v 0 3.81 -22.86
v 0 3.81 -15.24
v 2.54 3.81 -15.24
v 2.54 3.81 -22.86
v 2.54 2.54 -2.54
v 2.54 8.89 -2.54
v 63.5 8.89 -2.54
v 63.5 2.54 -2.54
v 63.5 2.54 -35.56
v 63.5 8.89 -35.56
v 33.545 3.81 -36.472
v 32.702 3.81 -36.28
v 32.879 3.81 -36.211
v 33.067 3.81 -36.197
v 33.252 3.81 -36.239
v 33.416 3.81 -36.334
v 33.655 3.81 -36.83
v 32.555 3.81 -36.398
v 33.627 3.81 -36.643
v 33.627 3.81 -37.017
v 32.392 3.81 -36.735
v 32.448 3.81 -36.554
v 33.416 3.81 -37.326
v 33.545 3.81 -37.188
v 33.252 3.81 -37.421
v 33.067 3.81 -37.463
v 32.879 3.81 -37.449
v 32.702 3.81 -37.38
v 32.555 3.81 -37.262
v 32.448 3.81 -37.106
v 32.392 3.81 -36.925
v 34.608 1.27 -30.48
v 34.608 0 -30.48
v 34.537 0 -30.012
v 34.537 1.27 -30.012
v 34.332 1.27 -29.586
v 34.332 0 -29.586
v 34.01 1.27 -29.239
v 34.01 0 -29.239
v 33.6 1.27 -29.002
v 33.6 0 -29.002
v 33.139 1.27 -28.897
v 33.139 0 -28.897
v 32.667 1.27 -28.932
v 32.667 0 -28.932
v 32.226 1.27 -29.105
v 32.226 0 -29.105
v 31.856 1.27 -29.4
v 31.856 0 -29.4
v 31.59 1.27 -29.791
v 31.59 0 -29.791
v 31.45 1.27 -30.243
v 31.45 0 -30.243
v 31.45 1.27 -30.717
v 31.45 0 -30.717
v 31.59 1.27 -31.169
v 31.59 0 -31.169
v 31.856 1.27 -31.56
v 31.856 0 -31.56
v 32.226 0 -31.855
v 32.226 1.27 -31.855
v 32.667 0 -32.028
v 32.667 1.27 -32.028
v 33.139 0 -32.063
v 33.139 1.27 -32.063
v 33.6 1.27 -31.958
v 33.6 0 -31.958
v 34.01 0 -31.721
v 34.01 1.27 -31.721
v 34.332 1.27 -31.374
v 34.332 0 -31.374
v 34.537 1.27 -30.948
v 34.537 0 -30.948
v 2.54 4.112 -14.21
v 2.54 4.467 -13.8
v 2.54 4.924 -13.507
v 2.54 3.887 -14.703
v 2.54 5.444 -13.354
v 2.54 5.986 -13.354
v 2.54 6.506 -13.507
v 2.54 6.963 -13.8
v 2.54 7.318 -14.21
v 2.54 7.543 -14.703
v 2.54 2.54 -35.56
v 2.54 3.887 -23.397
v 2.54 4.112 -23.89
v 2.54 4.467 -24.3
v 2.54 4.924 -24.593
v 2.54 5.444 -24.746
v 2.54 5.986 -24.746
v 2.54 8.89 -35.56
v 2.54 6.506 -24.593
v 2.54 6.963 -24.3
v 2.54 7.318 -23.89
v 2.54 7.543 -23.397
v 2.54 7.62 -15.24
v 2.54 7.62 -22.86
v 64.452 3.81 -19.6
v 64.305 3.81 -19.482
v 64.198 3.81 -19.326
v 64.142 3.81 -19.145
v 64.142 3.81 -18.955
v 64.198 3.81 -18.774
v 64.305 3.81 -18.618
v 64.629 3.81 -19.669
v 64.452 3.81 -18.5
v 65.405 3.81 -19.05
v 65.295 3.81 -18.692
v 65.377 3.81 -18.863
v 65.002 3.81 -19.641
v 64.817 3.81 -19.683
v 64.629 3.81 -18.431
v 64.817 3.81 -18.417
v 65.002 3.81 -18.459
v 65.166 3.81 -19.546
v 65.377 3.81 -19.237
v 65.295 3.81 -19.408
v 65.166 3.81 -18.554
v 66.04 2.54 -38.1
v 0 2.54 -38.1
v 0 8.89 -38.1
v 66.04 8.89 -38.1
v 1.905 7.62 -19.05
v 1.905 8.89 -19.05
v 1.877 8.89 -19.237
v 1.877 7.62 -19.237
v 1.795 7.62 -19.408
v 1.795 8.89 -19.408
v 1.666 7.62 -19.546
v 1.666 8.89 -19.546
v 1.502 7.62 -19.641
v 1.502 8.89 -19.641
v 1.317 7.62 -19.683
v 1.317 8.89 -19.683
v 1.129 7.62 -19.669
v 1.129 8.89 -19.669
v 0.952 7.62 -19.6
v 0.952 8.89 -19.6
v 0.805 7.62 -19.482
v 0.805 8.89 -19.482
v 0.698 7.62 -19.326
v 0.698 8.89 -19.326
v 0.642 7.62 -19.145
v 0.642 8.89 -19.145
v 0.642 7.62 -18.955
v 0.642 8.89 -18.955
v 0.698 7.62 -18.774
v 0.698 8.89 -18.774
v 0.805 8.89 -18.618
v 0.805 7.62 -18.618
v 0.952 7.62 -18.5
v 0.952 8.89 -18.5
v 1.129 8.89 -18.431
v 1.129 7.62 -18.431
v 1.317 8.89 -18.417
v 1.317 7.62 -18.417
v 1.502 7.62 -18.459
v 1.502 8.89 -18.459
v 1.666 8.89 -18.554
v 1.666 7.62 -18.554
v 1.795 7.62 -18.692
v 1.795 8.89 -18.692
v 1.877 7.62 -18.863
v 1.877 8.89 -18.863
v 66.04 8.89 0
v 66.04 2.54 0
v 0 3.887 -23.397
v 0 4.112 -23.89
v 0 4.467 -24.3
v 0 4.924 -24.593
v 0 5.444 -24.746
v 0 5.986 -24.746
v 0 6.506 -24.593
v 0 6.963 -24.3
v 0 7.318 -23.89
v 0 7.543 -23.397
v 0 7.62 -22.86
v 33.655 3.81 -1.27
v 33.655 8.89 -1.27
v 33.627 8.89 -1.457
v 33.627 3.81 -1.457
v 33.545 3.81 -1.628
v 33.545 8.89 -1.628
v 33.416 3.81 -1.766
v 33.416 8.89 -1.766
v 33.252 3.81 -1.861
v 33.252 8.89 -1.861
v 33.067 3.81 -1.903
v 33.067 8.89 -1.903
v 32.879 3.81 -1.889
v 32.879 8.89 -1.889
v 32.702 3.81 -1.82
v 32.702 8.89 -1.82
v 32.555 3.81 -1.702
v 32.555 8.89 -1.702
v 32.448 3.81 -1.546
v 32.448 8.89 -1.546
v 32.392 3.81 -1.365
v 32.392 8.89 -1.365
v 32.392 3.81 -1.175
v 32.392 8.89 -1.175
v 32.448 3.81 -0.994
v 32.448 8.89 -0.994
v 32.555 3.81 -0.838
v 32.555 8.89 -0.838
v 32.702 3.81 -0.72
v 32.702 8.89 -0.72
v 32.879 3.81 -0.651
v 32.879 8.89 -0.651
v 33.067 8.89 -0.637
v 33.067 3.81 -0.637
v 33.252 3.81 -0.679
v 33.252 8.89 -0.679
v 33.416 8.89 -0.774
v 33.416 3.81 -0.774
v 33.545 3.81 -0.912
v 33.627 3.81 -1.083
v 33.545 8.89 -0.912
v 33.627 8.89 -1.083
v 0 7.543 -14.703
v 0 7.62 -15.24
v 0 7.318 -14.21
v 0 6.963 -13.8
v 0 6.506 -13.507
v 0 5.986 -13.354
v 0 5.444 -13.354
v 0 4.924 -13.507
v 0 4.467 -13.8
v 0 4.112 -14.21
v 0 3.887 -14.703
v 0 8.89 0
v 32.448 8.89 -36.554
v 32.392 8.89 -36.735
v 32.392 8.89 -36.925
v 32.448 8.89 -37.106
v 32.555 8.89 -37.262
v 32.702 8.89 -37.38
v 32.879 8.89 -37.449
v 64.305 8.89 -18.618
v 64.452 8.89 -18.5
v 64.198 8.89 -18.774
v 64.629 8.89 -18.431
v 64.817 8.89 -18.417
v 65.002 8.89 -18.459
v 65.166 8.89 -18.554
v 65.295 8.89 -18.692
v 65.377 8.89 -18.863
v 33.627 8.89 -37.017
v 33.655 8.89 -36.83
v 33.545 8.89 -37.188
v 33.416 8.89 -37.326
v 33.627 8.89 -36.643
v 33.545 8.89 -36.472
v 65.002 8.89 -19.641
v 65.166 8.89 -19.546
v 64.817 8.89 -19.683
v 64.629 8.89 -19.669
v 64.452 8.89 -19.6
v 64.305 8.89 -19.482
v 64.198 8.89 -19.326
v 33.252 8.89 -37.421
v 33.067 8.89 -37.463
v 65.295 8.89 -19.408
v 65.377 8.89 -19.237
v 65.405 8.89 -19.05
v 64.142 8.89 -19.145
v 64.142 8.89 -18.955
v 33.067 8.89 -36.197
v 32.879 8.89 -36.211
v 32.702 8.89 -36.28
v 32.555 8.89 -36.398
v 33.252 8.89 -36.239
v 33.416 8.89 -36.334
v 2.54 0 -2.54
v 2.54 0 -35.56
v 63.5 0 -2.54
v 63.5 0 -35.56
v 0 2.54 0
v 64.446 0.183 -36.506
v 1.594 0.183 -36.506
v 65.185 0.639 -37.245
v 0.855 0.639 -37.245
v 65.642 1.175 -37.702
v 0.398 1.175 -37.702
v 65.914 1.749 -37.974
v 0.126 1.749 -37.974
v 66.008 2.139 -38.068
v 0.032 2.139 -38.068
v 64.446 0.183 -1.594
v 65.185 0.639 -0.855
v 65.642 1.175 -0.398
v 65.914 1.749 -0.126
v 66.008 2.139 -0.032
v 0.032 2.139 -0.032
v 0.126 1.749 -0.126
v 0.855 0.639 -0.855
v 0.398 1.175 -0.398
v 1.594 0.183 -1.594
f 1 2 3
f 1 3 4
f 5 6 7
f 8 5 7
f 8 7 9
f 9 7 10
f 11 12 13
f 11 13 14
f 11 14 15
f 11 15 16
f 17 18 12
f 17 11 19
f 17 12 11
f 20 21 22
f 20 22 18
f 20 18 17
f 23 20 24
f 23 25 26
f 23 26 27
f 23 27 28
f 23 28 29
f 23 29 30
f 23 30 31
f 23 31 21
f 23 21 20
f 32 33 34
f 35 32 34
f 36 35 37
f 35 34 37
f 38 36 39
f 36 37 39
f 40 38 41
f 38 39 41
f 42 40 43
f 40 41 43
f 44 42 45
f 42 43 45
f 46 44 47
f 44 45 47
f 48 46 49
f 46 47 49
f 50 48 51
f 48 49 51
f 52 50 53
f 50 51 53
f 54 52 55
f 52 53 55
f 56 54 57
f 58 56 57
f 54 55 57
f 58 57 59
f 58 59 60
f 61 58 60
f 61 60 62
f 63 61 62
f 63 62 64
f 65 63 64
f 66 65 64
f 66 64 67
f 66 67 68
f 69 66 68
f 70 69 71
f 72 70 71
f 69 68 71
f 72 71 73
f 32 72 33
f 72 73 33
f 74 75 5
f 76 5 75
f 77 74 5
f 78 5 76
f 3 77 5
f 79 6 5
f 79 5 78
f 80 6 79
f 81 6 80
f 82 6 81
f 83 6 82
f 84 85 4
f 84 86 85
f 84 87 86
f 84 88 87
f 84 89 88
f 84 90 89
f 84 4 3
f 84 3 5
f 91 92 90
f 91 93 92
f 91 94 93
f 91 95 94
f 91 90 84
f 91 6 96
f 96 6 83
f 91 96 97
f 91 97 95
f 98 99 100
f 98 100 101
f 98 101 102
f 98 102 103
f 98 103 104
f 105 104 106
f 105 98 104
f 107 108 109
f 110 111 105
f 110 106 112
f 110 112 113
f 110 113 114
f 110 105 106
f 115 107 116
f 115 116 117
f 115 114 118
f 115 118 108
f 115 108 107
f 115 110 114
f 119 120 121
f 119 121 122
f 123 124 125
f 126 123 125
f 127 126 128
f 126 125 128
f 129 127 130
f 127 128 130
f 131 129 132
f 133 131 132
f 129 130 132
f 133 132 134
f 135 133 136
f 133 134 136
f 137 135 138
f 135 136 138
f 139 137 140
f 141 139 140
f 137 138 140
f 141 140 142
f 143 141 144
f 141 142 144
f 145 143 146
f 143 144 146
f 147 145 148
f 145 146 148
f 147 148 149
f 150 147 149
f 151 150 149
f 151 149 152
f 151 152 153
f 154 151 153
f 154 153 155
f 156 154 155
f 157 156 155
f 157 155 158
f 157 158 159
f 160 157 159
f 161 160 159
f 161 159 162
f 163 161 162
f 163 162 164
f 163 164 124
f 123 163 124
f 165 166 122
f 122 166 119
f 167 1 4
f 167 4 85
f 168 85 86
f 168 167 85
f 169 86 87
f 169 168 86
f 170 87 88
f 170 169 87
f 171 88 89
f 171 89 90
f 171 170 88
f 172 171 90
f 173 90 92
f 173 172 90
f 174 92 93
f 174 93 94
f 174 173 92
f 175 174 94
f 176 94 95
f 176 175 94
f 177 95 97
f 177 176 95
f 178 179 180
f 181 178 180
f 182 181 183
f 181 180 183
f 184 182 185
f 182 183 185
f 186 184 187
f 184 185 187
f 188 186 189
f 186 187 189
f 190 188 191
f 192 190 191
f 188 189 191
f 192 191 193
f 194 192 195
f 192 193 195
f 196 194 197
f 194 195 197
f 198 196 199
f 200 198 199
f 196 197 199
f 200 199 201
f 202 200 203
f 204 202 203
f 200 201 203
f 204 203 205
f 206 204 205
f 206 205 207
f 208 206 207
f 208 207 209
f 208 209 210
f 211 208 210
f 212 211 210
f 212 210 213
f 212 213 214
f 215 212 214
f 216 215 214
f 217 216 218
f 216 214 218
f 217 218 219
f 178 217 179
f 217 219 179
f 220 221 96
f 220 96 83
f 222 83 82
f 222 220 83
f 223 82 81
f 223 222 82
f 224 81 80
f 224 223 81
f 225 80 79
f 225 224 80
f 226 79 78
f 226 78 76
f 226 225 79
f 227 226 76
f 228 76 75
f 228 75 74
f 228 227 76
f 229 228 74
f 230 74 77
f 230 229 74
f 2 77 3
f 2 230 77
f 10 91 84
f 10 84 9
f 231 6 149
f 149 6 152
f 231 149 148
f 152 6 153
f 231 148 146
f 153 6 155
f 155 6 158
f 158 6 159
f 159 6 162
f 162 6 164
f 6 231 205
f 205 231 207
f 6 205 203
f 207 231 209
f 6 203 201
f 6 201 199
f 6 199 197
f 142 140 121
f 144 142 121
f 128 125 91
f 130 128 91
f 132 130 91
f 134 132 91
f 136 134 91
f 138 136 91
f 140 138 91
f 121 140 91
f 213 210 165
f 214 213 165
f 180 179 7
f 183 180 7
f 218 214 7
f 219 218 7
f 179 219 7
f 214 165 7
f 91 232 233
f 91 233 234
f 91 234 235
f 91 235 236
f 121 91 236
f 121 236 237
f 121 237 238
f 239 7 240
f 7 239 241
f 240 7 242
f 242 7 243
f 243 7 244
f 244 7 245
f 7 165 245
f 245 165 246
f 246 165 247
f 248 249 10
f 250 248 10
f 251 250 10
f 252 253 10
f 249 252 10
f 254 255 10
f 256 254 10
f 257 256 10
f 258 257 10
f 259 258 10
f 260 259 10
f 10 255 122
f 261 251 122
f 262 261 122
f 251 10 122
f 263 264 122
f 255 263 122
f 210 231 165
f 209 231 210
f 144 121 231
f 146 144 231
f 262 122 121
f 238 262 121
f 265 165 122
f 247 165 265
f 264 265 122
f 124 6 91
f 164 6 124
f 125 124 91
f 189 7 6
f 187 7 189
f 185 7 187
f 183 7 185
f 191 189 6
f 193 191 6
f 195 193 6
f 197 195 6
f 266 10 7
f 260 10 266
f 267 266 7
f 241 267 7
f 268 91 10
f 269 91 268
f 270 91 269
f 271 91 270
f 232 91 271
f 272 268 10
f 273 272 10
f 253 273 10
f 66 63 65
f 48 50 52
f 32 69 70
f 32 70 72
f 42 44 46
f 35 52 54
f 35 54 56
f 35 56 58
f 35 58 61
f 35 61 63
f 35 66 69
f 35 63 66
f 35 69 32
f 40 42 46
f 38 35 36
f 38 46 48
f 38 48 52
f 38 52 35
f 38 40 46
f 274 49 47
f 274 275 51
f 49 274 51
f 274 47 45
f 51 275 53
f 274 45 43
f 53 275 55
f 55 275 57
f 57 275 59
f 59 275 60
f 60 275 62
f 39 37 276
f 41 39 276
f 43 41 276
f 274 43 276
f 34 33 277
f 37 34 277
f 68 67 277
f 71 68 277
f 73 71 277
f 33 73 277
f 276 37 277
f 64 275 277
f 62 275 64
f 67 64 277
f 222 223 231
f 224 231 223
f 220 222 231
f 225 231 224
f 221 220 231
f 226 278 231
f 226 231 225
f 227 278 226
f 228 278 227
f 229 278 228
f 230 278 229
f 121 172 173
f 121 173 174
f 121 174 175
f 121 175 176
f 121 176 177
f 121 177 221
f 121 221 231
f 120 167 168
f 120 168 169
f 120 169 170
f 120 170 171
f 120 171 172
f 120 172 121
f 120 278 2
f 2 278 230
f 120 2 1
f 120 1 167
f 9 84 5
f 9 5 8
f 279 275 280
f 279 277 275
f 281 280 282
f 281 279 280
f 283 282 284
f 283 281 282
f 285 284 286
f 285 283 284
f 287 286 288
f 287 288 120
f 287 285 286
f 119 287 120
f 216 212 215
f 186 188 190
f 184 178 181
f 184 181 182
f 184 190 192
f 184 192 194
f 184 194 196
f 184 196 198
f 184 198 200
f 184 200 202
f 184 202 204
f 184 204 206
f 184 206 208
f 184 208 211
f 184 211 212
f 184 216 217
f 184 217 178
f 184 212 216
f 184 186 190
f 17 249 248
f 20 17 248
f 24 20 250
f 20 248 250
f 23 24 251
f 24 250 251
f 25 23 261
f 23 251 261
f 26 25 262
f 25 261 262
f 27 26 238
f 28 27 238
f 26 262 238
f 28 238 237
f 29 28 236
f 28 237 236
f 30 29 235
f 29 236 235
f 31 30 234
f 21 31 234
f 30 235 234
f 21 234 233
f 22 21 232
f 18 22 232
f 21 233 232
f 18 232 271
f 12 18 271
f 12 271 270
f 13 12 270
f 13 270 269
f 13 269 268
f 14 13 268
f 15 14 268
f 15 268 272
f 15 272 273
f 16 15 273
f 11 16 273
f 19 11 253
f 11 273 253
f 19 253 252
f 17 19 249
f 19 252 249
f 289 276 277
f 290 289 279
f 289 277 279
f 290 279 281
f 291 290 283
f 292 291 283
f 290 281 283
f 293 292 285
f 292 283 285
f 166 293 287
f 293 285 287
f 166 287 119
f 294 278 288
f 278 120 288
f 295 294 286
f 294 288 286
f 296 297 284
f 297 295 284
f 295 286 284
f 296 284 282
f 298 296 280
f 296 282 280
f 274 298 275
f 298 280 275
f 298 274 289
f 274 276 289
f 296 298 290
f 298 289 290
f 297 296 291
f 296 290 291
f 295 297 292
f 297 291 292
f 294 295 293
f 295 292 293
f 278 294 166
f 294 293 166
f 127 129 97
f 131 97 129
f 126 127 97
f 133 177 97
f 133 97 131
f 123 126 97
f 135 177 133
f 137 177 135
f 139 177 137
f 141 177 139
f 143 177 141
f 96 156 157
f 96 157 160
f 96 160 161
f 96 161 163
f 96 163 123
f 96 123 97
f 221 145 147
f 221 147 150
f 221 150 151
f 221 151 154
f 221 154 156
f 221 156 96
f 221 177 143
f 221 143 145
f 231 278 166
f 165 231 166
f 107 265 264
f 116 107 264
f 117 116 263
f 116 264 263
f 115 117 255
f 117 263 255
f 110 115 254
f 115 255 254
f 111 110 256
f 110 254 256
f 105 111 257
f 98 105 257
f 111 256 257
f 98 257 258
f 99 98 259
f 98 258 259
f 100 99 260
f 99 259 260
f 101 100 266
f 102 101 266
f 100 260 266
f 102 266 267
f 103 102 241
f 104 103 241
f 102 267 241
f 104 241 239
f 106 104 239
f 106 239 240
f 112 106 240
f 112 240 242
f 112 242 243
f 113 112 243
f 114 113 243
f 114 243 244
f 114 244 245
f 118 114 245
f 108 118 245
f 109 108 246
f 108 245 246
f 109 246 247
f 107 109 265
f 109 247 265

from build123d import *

# Parameters (mm, degrees)
SKETCH1_W           = 66.04
SKETCH1_H           = 38.1
BOSS_EXTRUDE3_DEPTH = 17.78
SKETCH3_W           = 60.96
SKETCH3_H           = 33.02
CUT_EXTRUDE1_DEPTH  = 15.24
SKETCH4_W           = 38.1
SKETCH4_H           = 8.89
CUT_EXTRUDE2_DEPTH  = 66.04
SKETCH5_R           = 0.635
CUT_EXTRUDE3_DEPTH  = 5.08
CUT_EXTRUDE5_DEPTH  = 2.54
FILLET1_R           = 2.54
SKETCH7_R           = 1.5875
CUT_EXTRUDE6_DEPTH  = 1.27


with BuildPart() as part:
    # Sketch1 → Boss-Extrude3 (new body)
    with BuildSketch(Plane(origin=(0, 0, 0), x_dir=(1, 0, 0), z_dir=(0, 1, 0))):
        with Locations((33.02, 19.05)):
            Rectangle(SKETCH1_W, SKETCH1_H)
    extrude(amount=BOSS_EXTRUDE3_DEPTH)

    # Sketch3 → Cut-Extrude1 (cut)
    with BuildSketch(Plane(origin=(0, 17.78, 0), x_dir=(1, 0, 0), z_dir=(0, 1, 0))):
        with Locations((33.02, 19.05)):
            Rectangle(SKETCH3_W, SKETCH3_H)
    extrude(amount=-CUT_EXTRUDE1_DEPTH, mode=Mode.SUBTRACT)

    # Sketch4 → Cut-Extrude2 (cut)
    with BuildSketch(Plane(origin=(66.04, 0, 0), x_dir=(0, 0, -1), z_dir=(1, 0, 0))):
        with Locations((19.05, 13.335)):
            Rectangle(SKETCH4_W, SKETCH4_H)
    extrude(amount=-CUT_EXTRUDE2_DEPTH, mode=Mode.SUBTRACT)

    # Sketch5 → Cut-Extrude3 (cut)
    with BuildSketch(Plane(origin=(0, 8.89, 0), x_dir=(1, 0, 0), z_dir=(0, 1, 0))):
        with Locations((33.02, 36.83)):
            Circle(SKETCH5_R)
        with Locations((33.02, 1.27)):
            Circle(SKETCH5_R)
        with Locations((1.27, 19.05)):
            Circle(SKETCH5_R)
        with Locations((64.77, 19.05)):
            Circle(SKETCH5_R)
    extrude(amount=-CUT_EXTRUDE3_DEPTH, mode=Mode.SUBTRACT)

    # Sketch6 → Cut-Extrude5 (cut)
    with BuildSketch(Plane.ZY):
        with BuildLine():
            Line((-22.86, 7.62), (-15.24, 7.62))
            ThreePointArc((-15.24, 7.62), (-13.335, 5.715), (-15.24, 3.81))
            Line((-15.24, 3.81), (-22.86, 3.81))
            ThreePointArc((-22.86, 3.81), (-24.765, 5.715), (-22.86, 7.62))
        make_face()
    extrude(amount=-CUT_EXTRUDE5_DEPTH, mode=Mode.SUBTRACT)

    # Fillet1
    fillet1_edges = [part.edges().sort_by_distance(p)[0] for p in [
        (33.02, 0, -38.1),
        (66.04, 0, -19.05),
        (33.02, 0, 0),
        (0, 0, -19.05),
    ]]
    fillet(fillet1_edges, radius=FILLET1_R)

    # Sketch7 → Cut-Extrude6 (cut)
    with BuildSketch(Plane.XZ):
        with Locations((33.02, -30.48)):
            Circle(SKETCH7_R)
    extrude(amount=-CUT_EXTRUDE6_DEPTH, mode=Mode.SUBTRACT)


solid = part.part
